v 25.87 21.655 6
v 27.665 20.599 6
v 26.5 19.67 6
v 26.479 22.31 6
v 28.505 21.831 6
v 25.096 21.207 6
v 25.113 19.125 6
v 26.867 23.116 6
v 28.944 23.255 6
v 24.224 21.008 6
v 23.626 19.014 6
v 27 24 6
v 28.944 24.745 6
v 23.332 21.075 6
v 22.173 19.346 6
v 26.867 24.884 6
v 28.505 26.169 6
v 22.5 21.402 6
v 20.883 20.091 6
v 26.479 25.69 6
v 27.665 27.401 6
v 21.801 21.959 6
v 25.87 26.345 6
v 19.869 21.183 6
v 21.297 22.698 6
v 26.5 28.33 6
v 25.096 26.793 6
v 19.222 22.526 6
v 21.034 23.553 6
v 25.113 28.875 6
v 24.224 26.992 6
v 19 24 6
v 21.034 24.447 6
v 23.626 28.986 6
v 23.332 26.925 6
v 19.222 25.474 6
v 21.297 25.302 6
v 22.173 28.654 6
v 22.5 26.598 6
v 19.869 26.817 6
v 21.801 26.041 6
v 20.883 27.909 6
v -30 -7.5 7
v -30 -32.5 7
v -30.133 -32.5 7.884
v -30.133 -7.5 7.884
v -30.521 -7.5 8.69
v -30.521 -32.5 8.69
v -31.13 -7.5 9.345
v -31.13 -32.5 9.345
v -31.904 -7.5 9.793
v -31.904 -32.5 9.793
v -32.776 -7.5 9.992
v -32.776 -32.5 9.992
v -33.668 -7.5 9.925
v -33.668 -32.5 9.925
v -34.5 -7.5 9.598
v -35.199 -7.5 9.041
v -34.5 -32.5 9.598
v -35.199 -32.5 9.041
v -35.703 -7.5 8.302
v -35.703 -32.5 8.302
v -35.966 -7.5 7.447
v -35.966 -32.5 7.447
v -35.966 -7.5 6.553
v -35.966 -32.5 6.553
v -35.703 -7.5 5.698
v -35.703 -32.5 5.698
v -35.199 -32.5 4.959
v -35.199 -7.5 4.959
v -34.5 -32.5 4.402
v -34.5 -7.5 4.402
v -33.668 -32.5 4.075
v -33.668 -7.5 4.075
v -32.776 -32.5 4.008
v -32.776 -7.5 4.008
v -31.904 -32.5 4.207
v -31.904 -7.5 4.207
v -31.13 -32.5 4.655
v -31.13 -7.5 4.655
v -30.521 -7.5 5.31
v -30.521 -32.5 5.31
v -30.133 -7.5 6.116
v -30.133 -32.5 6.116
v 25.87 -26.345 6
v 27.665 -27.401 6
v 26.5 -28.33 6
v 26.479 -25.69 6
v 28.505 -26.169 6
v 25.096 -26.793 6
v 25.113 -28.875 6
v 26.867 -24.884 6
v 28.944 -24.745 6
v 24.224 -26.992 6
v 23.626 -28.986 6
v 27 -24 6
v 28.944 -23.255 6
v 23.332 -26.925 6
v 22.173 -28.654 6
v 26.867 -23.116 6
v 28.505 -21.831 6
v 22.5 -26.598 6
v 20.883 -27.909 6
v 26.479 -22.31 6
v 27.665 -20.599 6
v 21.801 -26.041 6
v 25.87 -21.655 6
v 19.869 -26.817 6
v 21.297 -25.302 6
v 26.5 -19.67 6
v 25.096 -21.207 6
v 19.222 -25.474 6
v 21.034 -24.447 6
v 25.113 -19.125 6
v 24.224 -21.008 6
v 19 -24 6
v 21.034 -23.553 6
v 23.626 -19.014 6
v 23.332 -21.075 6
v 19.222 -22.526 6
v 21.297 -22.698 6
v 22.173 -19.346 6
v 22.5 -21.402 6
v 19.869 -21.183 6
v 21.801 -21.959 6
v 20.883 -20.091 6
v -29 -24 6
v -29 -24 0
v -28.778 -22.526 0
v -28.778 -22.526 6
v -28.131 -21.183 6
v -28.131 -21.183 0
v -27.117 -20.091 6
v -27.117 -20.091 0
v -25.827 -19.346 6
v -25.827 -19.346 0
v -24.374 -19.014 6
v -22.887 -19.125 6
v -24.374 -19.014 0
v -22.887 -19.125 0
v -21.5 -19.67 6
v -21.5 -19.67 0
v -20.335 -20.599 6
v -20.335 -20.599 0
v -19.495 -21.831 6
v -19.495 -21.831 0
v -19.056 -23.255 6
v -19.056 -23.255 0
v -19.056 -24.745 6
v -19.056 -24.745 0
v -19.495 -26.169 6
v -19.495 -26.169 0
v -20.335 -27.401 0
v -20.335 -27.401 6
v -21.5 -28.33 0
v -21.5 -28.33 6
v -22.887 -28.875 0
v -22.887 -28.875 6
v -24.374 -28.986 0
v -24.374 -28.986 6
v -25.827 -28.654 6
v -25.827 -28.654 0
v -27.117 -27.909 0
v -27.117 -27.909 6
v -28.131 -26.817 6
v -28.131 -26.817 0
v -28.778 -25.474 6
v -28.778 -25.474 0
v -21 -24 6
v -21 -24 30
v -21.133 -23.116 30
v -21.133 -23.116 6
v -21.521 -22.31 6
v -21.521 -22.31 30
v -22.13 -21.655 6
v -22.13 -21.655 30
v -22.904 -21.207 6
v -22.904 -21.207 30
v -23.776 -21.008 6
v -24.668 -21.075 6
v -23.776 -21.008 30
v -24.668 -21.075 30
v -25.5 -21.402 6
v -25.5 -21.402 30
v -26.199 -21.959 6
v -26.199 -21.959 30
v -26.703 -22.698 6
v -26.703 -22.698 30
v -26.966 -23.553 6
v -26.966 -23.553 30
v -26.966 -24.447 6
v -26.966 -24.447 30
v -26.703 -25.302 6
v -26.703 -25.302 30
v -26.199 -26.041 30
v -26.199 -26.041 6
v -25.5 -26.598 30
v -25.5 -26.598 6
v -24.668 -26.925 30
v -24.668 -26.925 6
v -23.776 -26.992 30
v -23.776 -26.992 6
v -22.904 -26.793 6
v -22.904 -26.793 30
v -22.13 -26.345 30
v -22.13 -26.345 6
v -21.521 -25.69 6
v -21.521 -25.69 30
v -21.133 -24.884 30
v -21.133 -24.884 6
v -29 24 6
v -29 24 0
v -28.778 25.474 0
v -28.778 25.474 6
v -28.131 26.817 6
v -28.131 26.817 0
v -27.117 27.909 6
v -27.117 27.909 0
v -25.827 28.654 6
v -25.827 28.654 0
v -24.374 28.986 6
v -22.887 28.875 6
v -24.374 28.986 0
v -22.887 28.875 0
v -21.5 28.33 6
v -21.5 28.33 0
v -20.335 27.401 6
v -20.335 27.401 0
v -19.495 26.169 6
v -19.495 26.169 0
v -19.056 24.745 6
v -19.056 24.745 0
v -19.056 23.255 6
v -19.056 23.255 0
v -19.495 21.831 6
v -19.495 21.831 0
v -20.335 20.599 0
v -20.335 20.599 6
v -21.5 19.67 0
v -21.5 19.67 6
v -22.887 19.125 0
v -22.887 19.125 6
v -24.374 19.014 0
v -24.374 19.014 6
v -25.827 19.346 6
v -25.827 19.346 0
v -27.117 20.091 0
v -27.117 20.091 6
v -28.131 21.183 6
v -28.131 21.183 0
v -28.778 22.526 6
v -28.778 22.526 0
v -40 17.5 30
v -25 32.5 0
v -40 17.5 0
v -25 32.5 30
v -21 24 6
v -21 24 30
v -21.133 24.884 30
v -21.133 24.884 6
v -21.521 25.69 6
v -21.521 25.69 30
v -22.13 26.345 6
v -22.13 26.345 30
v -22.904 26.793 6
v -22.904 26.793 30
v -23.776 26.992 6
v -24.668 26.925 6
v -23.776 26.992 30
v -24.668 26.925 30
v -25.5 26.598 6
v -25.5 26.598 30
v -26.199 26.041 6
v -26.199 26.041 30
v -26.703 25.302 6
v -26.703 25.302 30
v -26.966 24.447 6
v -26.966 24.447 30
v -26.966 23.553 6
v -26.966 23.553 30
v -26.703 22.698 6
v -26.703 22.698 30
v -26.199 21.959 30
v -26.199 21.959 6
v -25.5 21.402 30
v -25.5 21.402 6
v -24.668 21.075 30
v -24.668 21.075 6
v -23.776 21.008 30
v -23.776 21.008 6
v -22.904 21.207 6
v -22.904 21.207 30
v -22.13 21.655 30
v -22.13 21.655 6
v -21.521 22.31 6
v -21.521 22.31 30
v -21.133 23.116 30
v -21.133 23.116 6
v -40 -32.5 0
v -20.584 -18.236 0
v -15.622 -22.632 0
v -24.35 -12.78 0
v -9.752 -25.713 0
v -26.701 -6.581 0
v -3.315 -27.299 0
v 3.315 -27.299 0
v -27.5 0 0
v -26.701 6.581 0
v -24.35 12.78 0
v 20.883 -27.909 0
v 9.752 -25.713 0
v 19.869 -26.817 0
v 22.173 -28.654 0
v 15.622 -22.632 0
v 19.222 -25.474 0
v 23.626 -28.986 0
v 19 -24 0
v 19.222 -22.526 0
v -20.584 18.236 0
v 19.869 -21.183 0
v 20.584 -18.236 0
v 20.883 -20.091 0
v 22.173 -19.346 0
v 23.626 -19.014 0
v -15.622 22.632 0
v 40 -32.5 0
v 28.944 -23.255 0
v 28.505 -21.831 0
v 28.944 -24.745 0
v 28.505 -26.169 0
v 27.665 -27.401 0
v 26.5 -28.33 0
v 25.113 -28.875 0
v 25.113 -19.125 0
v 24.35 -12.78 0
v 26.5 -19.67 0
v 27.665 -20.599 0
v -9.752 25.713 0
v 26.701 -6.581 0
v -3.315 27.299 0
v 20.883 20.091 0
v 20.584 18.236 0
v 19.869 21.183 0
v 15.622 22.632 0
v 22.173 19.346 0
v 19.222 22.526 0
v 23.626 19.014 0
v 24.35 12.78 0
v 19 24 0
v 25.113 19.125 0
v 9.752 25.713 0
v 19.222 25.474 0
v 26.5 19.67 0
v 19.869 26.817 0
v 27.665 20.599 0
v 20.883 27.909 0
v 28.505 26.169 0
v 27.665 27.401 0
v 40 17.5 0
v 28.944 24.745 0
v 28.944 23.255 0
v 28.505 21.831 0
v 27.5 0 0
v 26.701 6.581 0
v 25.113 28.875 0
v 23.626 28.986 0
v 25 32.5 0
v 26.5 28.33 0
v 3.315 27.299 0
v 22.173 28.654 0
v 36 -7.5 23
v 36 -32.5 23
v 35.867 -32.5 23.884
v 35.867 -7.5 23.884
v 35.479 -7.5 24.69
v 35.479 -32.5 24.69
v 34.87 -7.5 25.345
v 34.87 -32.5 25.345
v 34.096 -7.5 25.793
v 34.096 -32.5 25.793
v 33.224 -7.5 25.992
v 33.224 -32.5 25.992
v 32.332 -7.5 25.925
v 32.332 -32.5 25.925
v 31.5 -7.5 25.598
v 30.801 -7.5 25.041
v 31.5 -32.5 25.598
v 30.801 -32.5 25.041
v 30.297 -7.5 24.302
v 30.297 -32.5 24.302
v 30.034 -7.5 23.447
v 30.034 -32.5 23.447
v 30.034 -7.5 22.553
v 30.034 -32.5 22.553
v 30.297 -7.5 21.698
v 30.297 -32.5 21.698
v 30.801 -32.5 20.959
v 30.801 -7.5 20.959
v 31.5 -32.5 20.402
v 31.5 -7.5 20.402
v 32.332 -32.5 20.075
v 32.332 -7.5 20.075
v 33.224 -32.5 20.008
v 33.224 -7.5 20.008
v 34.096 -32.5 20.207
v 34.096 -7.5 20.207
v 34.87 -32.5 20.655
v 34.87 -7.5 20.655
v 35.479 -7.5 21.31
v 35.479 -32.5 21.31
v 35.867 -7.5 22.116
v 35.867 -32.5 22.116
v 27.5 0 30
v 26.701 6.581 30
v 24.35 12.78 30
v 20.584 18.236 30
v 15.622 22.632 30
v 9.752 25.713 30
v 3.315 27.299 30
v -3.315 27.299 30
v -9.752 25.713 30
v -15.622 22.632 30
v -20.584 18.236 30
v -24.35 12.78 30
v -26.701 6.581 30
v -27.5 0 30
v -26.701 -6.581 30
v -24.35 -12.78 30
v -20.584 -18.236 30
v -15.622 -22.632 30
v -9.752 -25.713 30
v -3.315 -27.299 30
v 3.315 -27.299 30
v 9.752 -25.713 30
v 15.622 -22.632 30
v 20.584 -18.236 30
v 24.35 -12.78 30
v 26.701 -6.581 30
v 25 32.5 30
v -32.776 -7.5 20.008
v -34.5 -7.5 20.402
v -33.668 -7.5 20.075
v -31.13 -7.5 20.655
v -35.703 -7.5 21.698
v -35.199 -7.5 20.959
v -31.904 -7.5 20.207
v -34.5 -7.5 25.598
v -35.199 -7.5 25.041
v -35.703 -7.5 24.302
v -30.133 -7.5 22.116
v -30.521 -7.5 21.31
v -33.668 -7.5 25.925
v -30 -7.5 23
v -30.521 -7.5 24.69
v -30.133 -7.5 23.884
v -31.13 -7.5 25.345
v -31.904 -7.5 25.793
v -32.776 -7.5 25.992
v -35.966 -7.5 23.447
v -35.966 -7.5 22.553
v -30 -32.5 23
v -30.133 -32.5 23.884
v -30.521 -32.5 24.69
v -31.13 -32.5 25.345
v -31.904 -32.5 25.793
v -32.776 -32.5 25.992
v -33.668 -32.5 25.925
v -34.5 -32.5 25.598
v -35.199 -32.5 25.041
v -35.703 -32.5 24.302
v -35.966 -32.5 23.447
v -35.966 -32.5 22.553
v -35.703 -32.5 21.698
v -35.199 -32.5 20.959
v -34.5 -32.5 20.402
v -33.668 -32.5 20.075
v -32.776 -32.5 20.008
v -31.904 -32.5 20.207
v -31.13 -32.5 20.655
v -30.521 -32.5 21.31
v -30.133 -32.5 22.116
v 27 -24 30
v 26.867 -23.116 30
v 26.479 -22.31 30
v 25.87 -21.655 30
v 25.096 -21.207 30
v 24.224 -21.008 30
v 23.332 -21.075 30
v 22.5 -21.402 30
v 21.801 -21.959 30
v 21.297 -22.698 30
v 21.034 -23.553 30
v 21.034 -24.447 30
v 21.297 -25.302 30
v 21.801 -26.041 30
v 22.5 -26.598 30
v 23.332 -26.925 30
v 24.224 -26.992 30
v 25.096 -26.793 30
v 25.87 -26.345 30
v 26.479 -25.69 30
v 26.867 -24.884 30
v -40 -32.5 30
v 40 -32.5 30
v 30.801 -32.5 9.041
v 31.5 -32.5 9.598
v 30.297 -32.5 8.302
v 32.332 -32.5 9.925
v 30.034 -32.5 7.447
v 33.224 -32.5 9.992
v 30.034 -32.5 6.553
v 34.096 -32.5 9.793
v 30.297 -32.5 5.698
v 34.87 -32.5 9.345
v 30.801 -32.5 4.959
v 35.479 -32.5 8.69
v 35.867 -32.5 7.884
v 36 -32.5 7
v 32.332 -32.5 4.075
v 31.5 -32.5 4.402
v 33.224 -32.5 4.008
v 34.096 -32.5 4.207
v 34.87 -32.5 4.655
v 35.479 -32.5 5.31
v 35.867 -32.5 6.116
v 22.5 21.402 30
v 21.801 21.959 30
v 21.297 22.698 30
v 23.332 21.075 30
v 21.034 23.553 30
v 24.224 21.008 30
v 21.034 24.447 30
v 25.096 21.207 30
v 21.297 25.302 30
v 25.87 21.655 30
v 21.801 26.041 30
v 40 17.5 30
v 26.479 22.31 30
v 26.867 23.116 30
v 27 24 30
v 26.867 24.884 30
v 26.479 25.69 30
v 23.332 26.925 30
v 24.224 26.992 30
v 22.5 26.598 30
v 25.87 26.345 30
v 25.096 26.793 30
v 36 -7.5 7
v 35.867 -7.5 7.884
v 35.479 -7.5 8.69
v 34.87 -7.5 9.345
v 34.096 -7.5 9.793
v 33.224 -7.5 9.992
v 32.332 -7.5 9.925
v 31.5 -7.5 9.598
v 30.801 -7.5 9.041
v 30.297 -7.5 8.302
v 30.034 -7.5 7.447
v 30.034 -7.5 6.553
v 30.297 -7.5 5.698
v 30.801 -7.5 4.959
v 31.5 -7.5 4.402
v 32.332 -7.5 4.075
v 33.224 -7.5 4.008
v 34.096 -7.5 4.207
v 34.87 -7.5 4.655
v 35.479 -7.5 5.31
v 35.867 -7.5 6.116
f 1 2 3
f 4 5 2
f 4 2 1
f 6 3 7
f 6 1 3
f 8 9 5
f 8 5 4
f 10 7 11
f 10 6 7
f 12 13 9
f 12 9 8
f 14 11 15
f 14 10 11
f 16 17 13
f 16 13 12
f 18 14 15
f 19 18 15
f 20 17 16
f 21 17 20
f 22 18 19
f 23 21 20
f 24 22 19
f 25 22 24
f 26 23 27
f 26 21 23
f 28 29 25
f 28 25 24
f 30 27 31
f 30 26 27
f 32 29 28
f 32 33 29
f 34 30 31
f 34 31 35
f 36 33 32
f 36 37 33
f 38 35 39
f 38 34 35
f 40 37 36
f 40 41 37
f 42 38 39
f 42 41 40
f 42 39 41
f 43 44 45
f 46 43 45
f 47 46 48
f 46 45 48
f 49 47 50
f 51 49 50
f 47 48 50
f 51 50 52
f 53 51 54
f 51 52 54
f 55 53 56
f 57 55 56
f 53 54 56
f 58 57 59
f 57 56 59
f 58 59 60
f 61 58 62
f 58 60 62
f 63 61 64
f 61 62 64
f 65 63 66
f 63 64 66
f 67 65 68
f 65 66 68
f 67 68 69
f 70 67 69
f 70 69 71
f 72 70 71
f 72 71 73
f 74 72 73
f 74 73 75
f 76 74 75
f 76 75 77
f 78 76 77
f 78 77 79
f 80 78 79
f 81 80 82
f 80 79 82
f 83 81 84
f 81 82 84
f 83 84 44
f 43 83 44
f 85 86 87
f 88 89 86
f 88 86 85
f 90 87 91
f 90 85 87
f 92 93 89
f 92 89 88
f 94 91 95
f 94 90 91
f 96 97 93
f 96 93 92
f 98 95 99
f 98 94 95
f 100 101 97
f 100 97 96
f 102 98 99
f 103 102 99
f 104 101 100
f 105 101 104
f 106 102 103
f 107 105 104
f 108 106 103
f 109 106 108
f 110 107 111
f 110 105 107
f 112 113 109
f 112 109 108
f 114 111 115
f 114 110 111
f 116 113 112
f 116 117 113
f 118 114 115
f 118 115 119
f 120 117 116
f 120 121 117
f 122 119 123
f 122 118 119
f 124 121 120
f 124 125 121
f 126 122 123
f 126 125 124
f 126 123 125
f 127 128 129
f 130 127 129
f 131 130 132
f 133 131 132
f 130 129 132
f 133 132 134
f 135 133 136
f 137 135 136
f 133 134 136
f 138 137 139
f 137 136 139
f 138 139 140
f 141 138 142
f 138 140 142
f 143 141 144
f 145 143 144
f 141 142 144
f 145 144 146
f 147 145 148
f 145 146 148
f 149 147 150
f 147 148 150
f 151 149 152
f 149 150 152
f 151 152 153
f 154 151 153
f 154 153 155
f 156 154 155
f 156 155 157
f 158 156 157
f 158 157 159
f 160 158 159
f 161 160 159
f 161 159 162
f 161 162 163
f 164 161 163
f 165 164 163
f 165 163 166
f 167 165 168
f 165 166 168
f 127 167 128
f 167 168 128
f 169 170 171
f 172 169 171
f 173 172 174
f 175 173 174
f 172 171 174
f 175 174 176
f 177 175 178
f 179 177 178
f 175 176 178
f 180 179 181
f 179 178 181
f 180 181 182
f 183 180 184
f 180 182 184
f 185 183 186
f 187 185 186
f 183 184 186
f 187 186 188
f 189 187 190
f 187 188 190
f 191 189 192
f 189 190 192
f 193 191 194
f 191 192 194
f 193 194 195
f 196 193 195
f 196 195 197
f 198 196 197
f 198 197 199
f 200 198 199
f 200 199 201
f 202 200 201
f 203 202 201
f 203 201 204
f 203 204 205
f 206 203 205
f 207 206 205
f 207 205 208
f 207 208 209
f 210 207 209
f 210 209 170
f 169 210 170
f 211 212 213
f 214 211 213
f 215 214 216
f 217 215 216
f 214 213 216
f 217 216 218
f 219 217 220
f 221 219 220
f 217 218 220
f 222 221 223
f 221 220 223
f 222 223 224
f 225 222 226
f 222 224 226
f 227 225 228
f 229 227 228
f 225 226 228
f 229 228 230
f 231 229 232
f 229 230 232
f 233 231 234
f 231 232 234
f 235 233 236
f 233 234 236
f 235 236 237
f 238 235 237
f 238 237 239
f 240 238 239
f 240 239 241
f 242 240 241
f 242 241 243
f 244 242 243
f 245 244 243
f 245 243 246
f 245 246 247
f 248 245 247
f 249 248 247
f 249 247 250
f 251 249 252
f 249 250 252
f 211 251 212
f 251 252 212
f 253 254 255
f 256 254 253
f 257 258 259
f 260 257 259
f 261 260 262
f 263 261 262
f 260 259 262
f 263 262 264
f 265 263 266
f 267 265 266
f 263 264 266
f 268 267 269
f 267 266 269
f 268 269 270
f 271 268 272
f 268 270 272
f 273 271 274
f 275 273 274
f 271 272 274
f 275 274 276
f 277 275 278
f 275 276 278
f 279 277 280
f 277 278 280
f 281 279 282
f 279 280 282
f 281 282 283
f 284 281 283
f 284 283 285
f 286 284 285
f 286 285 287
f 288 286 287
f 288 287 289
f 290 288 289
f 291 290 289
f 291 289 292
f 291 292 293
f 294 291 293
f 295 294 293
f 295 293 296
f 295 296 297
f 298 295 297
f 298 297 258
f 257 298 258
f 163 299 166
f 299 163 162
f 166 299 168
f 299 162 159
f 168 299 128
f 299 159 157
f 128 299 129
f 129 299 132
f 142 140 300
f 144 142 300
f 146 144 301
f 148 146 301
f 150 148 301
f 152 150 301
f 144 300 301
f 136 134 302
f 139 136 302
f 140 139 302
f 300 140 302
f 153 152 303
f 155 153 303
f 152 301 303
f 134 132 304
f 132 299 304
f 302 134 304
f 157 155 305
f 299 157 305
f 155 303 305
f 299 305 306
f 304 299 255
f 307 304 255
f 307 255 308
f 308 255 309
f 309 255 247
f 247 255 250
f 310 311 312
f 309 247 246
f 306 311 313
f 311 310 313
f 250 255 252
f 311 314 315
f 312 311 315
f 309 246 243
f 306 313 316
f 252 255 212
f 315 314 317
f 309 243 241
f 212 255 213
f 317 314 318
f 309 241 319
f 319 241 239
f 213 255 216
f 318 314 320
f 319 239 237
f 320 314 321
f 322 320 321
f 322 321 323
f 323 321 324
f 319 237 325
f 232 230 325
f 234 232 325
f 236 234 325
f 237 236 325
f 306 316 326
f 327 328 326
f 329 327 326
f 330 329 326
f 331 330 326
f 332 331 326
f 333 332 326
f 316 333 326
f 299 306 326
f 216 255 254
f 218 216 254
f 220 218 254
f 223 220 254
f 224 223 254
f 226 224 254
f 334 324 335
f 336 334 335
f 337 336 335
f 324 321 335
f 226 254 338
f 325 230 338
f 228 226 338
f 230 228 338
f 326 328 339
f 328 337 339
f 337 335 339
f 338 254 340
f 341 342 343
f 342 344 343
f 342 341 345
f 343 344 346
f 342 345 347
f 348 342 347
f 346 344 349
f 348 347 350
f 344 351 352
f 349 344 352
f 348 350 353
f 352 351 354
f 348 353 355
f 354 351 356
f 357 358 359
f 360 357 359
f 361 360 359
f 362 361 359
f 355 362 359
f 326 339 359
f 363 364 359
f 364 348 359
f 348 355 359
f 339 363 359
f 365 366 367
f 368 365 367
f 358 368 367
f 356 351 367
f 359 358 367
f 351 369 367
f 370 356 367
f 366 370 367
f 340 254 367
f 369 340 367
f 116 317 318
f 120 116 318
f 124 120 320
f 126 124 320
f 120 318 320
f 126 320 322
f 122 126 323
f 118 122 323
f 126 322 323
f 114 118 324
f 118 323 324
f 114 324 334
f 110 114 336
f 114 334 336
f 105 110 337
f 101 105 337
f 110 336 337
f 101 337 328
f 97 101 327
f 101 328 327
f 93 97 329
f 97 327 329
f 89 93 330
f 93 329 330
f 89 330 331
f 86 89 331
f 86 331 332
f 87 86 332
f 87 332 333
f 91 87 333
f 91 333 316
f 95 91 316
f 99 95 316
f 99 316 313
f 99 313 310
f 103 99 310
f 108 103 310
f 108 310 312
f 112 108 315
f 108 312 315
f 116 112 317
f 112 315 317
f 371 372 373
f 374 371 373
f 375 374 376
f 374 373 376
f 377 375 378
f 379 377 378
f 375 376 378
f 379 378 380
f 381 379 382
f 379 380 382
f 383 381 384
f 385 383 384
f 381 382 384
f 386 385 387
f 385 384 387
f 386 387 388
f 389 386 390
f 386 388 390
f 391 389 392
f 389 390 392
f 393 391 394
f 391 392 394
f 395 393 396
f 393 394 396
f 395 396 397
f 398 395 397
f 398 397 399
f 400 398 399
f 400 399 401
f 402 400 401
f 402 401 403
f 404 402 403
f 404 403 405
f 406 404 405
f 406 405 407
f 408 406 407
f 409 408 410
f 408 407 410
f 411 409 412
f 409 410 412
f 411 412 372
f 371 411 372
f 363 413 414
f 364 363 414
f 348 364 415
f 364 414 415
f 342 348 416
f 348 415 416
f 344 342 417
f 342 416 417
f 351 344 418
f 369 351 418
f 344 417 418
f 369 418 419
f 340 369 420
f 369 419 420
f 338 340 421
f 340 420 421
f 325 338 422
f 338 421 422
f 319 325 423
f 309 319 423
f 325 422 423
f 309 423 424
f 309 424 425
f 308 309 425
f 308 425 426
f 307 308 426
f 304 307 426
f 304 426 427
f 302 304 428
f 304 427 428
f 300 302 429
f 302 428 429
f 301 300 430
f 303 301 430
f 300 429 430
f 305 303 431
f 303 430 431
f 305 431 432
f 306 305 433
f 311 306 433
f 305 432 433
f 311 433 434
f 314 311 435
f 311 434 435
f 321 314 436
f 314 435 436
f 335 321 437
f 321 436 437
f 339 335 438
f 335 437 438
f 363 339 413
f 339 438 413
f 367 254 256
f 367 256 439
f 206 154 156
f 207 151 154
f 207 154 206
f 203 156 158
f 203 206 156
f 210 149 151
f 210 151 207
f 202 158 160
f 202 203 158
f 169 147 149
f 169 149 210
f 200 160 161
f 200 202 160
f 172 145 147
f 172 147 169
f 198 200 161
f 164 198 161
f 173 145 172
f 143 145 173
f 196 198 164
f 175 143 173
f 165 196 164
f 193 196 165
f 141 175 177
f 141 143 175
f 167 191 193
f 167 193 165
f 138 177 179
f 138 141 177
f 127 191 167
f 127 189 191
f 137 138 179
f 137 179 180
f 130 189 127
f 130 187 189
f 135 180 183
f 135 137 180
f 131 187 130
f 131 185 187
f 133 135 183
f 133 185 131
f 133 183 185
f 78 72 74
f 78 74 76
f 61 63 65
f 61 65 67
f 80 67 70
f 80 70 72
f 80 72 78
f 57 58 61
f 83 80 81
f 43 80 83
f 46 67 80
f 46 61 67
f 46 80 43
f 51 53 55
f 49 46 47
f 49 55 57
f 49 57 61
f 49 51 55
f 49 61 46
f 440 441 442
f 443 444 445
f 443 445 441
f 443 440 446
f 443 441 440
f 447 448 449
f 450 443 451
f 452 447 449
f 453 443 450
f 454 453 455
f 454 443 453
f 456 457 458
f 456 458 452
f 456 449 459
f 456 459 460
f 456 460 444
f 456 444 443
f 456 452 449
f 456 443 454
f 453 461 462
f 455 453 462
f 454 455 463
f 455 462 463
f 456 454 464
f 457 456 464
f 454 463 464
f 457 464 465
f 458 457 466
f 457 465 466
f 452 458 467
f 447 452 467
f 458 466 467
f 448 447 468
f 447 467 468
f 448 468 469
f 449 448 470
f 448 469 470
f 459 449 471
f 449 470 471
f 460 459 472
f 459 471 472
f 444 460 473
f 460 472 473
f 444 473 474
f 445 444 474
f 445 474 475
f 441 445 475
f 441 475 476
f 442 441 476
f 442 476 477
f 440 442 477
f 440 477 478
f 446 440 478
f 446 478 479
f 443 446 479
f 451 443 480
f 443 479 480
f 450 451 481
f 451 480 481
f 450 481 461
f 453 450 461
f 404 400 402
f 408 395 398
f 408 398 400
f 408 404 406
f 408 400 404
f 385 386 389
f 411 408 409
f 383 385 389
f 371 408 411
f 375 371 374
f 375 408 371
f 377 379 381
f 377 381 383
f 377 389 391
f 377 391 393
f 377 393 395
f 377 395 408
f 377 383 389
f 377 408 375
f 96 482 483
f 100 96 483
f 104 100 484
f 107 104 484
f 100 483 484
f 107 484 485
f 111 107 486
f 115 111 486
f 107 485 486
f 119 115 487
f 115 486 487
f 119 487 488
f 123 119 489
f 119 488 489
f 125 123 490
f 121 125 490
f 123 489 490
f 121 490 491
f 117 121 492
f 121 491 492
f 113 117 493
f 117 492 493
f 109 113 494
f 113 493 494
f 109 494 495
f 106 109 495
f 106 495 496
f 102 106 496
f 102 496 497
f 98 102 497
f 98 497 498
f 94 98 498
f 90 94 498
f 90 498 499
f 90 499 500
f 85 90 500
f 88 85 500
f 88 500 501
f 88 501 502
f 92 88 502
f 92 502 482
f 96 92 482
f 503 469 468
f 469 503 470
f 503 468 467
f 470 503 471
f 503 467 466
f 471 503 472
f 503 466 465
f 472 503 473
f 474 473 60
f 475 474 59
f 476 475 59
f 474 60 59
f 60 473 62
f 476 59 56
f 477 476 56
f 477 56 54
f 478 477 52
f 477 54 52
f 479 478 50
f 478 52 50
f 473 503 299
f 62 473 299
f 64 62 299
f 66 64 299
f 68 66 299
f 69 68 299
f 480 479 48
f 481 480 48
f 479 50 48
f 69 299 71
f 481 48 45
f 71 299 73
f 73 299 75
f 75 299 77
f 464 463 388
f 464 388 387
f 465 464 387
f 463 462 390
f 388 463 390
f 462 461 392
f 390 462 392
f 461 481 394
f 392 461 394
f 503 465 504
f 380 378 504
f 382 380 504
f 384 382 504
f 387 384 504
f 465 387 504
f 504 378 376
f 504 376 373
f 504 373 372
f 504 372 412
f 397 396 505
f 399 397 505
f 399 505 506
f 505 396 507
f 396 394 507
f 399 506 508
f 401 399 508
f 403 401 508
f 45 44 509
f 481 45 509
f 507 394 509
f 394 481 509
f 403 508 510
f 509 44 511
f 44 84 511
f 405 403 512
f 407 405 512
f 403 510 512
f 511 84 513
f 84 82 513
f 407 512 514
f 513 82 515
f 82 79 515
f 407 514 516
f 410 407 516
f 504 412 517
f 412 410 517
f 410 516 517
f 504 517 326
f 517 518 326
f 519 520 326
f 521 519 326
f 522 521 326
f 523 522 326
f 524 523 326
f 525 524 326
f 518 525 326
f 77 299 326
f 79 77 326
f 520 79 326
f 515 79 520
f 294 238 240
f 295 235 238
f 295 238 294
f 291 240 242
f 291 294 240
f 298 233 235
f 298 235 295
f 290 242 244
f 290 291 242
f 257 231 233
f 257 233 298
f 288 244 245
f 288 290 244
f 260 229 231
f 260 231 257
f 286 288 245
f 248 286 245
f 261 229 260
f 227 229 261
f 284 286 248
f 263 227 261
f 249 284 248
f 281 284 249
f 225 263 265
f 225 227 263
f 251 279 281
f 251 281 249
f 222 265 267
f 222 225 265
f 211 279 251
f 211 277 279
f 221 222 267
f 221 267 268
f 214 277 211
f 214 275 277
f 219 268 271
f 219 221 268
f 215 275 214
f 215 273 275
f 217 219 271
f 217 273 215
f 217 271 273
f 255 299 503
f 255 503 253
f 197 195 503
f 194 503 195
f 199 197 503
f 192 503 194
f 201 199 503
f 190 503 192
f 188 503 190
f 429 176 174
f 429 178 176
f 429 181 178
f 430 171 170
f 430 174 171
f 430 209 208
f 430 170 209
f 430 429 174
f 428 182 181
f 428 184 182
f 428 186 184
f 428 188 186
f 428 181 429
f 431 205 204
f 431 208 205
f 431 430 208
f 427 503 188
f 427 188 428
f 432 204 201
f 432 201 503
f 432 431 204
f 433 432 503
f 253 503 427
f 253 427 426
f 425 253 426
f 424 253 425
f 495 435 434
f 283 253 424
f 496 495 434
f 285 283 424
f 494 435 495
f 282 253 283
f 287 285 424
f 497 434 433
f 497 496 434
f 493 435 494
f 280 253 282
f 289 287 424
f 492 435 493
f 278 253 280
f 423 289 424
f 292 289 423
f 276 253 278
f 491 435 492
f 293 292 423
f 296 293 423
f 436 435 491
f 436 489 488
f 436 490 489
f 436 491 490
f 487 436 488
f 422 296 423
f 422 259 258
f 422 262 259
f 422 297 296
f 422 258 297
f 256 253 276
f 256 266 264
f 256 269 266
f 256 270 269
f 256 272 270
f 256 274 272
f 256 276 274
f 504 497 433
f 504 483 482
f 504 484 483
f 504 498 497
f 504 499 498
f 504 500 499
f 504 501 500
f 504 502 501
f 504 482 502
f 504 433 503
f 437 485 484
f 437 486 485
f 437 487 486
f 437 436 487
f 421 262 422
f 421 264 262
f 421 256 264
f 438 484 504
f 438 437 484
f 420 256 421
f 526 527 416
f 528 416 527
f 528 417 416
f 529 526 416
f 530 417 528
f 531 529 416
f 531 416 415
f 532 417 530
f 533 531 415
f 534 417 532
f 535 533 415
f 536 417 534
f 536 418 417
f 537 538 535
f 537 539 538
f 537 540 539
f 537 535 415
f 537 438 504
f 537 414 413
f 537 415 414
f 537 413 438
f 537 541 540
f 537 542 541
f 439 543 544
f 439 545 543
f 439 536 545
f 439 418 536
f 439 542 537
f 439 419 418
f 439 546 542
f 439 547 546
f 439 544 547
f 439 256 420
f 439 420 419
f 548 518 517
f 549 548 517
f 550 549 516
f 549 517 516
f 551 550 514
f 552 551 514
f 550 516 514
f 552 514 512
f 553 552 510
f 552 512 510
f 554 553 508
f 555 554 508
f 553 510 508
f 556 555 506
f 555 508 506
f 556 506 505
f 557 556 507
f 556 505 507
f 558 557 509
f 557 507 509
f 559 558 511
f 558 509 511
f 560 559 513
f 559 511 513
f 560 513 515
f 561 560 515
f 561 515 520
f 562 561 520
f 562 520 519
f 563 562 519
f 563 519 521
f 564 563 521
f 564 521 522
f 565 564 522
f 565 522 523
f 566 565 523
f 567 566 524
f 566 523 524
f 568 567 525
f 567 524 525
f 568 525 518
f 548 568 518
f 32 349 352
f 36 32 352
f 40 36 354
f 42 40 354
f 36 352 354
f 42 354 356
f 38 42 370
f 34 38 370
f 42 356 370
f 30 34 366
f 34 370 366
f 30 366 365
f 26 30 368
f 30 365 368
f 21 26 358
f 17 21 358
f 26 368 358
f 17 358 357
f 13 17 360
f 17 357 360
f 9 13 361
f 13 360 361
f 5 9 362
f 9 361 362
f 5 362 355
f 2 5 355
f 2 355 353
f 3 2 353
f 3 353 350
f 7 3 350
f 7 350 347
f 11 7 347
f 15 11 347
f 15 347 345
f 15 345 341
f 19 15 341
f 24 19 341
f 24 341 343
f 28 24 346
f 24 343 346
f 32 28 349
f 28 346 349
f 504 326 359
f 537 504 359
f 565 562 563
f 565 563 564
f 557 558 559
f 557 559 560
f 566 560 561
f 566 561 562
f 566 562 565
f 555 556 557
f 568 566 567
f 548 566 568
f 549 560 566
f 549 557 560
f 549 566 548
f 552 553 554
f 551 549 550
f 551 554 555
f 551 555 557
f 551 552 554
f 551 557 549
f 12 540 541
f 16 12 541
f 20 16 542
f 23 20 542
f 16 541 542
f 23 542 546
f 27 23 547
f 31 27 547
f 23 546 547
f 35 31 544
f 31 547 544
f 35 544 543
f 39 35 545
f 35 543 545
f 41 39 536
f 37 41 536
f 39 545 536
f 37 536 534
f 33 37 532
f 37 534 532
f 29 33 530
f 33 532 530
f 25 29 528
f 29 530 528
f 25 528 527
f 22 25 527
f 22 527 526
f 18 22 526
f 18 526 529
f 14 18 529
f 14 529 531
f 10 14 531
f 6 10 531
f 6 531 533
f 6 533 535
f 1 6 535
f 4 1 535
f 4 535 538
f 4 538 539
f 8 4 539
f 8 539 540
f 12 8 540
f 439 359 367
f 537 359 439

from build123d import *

# Parameters (mm, degrees)
SZKIC1_W                    = 80
SZKIC1_H                    = 65
DODANIE_WYCI_GNI_CIE1_DEPTH = 30
SZKIC2_R                    = 27.5
WYTNIJ_WYCI_GNI_CIE1_DEPTH  = 30
SZKIC4_R                    = 3
WYTNIJ_WYCI_GNI_CIE2_DEPTH  = 30
SFAZOWANIE1_SIZE            = 15
SZKIC6_R                    = 3
WYTNIJ_WYCI_GNI_CIE3_DEPTH  = 25
SZKIC8_R                    = 5
WYTNIJ_WYCI_GNI_CIE5_DEPTH  = 6


with BuildPart() as part:
    # Szkic1 → Dodanie-wyciągnięcie1 (new body)
    with BuildSketch(Plane.XY):
        Rectangle(SZKIC1_W, SZKIC1_H)
    extrude(amount=DODANIE_WYCI_GNI_CIE1_DEPTH)

    # Szkic2 → Wytnij-wyciągnięcie1 (cut)
    with BuildSketch(Plane.XY.offset(30)):
        Circle(SZKIC2_R)
    extrude(amount=-WYTNIJ_WYCI_GNI_CIE1_DEPTH, mode=Mode.SUBTRACT)

    # Szkic4 → Wytnij-wyciągnięcie2 (cut)
    with BuildSketch(Plane.XY.offset(30)):
        with Locations((-24, 24)):
            Circle(SZKIC4_R)
        with Locations((24, 24)):
            Circle(SZKIC4_R)
        with Locations((-24, -24)):
            Circle(SZKIC4_R)
        with Locations((24, -24)):
            Circle(SZKIC4_R)
    extrude(amount=-WYTNIJ_WYCI_GNI_CIE2_DEPTH, mode=Mode.SUBTRACT)

    # Sfazowanie1
    sfazowanie1_edges = [part.edges().sort_by_distance(p)[0] for p in [
        (-40, 32.5, 15),
        (40, 32.5, 15),
    ]]
    chamfer(sfazowanie1_edges, length=SFAZOWANIE1_SIZE)

    # Szkic6 → Wytnij-wyciągnięcie3 (cut)
    with BuildSketch(Plane.XZ.offset(32.5)):
        with Locations((-33, 23)):
            Circle(SZKIC6_R)
        with Locations((33, 23)):
            Circle(SZKIC6_R)
        with Locations((33, 7)):
            Circle(SZKIC6_R)
        with Locations((-33, 7)):
            Circle(SZKIC6_R)
    extrude(amount=-WYTNIJ_WYCI_GNI_CIE3_DEPTH, mode=Mode.SUBTRACT)

    # Szkic8 → Wytnij-wyciągnięcie5 (cut)
    with BuildSketch(Plane(origin=(0, 0, 0), x_dir=(-1, 0, 0), z_dir=(0, 0, -1))):
        with Locations((24, -24)):
            Circle(SZKIC8_R)
        with Locations((-24, -24)):
            Circle(SZKIC8_R)
        with Locations((-24, 24)):
            Circle(SZKIC8_R)
        with Locations((24, 24)):
            Circle(SZKIC8_R)
    extrude(amount=-WYTNIJ_WYCI_GNI_CIE5_DEPTH, mode=Mode.SUBTRACT)


solid = part.part
